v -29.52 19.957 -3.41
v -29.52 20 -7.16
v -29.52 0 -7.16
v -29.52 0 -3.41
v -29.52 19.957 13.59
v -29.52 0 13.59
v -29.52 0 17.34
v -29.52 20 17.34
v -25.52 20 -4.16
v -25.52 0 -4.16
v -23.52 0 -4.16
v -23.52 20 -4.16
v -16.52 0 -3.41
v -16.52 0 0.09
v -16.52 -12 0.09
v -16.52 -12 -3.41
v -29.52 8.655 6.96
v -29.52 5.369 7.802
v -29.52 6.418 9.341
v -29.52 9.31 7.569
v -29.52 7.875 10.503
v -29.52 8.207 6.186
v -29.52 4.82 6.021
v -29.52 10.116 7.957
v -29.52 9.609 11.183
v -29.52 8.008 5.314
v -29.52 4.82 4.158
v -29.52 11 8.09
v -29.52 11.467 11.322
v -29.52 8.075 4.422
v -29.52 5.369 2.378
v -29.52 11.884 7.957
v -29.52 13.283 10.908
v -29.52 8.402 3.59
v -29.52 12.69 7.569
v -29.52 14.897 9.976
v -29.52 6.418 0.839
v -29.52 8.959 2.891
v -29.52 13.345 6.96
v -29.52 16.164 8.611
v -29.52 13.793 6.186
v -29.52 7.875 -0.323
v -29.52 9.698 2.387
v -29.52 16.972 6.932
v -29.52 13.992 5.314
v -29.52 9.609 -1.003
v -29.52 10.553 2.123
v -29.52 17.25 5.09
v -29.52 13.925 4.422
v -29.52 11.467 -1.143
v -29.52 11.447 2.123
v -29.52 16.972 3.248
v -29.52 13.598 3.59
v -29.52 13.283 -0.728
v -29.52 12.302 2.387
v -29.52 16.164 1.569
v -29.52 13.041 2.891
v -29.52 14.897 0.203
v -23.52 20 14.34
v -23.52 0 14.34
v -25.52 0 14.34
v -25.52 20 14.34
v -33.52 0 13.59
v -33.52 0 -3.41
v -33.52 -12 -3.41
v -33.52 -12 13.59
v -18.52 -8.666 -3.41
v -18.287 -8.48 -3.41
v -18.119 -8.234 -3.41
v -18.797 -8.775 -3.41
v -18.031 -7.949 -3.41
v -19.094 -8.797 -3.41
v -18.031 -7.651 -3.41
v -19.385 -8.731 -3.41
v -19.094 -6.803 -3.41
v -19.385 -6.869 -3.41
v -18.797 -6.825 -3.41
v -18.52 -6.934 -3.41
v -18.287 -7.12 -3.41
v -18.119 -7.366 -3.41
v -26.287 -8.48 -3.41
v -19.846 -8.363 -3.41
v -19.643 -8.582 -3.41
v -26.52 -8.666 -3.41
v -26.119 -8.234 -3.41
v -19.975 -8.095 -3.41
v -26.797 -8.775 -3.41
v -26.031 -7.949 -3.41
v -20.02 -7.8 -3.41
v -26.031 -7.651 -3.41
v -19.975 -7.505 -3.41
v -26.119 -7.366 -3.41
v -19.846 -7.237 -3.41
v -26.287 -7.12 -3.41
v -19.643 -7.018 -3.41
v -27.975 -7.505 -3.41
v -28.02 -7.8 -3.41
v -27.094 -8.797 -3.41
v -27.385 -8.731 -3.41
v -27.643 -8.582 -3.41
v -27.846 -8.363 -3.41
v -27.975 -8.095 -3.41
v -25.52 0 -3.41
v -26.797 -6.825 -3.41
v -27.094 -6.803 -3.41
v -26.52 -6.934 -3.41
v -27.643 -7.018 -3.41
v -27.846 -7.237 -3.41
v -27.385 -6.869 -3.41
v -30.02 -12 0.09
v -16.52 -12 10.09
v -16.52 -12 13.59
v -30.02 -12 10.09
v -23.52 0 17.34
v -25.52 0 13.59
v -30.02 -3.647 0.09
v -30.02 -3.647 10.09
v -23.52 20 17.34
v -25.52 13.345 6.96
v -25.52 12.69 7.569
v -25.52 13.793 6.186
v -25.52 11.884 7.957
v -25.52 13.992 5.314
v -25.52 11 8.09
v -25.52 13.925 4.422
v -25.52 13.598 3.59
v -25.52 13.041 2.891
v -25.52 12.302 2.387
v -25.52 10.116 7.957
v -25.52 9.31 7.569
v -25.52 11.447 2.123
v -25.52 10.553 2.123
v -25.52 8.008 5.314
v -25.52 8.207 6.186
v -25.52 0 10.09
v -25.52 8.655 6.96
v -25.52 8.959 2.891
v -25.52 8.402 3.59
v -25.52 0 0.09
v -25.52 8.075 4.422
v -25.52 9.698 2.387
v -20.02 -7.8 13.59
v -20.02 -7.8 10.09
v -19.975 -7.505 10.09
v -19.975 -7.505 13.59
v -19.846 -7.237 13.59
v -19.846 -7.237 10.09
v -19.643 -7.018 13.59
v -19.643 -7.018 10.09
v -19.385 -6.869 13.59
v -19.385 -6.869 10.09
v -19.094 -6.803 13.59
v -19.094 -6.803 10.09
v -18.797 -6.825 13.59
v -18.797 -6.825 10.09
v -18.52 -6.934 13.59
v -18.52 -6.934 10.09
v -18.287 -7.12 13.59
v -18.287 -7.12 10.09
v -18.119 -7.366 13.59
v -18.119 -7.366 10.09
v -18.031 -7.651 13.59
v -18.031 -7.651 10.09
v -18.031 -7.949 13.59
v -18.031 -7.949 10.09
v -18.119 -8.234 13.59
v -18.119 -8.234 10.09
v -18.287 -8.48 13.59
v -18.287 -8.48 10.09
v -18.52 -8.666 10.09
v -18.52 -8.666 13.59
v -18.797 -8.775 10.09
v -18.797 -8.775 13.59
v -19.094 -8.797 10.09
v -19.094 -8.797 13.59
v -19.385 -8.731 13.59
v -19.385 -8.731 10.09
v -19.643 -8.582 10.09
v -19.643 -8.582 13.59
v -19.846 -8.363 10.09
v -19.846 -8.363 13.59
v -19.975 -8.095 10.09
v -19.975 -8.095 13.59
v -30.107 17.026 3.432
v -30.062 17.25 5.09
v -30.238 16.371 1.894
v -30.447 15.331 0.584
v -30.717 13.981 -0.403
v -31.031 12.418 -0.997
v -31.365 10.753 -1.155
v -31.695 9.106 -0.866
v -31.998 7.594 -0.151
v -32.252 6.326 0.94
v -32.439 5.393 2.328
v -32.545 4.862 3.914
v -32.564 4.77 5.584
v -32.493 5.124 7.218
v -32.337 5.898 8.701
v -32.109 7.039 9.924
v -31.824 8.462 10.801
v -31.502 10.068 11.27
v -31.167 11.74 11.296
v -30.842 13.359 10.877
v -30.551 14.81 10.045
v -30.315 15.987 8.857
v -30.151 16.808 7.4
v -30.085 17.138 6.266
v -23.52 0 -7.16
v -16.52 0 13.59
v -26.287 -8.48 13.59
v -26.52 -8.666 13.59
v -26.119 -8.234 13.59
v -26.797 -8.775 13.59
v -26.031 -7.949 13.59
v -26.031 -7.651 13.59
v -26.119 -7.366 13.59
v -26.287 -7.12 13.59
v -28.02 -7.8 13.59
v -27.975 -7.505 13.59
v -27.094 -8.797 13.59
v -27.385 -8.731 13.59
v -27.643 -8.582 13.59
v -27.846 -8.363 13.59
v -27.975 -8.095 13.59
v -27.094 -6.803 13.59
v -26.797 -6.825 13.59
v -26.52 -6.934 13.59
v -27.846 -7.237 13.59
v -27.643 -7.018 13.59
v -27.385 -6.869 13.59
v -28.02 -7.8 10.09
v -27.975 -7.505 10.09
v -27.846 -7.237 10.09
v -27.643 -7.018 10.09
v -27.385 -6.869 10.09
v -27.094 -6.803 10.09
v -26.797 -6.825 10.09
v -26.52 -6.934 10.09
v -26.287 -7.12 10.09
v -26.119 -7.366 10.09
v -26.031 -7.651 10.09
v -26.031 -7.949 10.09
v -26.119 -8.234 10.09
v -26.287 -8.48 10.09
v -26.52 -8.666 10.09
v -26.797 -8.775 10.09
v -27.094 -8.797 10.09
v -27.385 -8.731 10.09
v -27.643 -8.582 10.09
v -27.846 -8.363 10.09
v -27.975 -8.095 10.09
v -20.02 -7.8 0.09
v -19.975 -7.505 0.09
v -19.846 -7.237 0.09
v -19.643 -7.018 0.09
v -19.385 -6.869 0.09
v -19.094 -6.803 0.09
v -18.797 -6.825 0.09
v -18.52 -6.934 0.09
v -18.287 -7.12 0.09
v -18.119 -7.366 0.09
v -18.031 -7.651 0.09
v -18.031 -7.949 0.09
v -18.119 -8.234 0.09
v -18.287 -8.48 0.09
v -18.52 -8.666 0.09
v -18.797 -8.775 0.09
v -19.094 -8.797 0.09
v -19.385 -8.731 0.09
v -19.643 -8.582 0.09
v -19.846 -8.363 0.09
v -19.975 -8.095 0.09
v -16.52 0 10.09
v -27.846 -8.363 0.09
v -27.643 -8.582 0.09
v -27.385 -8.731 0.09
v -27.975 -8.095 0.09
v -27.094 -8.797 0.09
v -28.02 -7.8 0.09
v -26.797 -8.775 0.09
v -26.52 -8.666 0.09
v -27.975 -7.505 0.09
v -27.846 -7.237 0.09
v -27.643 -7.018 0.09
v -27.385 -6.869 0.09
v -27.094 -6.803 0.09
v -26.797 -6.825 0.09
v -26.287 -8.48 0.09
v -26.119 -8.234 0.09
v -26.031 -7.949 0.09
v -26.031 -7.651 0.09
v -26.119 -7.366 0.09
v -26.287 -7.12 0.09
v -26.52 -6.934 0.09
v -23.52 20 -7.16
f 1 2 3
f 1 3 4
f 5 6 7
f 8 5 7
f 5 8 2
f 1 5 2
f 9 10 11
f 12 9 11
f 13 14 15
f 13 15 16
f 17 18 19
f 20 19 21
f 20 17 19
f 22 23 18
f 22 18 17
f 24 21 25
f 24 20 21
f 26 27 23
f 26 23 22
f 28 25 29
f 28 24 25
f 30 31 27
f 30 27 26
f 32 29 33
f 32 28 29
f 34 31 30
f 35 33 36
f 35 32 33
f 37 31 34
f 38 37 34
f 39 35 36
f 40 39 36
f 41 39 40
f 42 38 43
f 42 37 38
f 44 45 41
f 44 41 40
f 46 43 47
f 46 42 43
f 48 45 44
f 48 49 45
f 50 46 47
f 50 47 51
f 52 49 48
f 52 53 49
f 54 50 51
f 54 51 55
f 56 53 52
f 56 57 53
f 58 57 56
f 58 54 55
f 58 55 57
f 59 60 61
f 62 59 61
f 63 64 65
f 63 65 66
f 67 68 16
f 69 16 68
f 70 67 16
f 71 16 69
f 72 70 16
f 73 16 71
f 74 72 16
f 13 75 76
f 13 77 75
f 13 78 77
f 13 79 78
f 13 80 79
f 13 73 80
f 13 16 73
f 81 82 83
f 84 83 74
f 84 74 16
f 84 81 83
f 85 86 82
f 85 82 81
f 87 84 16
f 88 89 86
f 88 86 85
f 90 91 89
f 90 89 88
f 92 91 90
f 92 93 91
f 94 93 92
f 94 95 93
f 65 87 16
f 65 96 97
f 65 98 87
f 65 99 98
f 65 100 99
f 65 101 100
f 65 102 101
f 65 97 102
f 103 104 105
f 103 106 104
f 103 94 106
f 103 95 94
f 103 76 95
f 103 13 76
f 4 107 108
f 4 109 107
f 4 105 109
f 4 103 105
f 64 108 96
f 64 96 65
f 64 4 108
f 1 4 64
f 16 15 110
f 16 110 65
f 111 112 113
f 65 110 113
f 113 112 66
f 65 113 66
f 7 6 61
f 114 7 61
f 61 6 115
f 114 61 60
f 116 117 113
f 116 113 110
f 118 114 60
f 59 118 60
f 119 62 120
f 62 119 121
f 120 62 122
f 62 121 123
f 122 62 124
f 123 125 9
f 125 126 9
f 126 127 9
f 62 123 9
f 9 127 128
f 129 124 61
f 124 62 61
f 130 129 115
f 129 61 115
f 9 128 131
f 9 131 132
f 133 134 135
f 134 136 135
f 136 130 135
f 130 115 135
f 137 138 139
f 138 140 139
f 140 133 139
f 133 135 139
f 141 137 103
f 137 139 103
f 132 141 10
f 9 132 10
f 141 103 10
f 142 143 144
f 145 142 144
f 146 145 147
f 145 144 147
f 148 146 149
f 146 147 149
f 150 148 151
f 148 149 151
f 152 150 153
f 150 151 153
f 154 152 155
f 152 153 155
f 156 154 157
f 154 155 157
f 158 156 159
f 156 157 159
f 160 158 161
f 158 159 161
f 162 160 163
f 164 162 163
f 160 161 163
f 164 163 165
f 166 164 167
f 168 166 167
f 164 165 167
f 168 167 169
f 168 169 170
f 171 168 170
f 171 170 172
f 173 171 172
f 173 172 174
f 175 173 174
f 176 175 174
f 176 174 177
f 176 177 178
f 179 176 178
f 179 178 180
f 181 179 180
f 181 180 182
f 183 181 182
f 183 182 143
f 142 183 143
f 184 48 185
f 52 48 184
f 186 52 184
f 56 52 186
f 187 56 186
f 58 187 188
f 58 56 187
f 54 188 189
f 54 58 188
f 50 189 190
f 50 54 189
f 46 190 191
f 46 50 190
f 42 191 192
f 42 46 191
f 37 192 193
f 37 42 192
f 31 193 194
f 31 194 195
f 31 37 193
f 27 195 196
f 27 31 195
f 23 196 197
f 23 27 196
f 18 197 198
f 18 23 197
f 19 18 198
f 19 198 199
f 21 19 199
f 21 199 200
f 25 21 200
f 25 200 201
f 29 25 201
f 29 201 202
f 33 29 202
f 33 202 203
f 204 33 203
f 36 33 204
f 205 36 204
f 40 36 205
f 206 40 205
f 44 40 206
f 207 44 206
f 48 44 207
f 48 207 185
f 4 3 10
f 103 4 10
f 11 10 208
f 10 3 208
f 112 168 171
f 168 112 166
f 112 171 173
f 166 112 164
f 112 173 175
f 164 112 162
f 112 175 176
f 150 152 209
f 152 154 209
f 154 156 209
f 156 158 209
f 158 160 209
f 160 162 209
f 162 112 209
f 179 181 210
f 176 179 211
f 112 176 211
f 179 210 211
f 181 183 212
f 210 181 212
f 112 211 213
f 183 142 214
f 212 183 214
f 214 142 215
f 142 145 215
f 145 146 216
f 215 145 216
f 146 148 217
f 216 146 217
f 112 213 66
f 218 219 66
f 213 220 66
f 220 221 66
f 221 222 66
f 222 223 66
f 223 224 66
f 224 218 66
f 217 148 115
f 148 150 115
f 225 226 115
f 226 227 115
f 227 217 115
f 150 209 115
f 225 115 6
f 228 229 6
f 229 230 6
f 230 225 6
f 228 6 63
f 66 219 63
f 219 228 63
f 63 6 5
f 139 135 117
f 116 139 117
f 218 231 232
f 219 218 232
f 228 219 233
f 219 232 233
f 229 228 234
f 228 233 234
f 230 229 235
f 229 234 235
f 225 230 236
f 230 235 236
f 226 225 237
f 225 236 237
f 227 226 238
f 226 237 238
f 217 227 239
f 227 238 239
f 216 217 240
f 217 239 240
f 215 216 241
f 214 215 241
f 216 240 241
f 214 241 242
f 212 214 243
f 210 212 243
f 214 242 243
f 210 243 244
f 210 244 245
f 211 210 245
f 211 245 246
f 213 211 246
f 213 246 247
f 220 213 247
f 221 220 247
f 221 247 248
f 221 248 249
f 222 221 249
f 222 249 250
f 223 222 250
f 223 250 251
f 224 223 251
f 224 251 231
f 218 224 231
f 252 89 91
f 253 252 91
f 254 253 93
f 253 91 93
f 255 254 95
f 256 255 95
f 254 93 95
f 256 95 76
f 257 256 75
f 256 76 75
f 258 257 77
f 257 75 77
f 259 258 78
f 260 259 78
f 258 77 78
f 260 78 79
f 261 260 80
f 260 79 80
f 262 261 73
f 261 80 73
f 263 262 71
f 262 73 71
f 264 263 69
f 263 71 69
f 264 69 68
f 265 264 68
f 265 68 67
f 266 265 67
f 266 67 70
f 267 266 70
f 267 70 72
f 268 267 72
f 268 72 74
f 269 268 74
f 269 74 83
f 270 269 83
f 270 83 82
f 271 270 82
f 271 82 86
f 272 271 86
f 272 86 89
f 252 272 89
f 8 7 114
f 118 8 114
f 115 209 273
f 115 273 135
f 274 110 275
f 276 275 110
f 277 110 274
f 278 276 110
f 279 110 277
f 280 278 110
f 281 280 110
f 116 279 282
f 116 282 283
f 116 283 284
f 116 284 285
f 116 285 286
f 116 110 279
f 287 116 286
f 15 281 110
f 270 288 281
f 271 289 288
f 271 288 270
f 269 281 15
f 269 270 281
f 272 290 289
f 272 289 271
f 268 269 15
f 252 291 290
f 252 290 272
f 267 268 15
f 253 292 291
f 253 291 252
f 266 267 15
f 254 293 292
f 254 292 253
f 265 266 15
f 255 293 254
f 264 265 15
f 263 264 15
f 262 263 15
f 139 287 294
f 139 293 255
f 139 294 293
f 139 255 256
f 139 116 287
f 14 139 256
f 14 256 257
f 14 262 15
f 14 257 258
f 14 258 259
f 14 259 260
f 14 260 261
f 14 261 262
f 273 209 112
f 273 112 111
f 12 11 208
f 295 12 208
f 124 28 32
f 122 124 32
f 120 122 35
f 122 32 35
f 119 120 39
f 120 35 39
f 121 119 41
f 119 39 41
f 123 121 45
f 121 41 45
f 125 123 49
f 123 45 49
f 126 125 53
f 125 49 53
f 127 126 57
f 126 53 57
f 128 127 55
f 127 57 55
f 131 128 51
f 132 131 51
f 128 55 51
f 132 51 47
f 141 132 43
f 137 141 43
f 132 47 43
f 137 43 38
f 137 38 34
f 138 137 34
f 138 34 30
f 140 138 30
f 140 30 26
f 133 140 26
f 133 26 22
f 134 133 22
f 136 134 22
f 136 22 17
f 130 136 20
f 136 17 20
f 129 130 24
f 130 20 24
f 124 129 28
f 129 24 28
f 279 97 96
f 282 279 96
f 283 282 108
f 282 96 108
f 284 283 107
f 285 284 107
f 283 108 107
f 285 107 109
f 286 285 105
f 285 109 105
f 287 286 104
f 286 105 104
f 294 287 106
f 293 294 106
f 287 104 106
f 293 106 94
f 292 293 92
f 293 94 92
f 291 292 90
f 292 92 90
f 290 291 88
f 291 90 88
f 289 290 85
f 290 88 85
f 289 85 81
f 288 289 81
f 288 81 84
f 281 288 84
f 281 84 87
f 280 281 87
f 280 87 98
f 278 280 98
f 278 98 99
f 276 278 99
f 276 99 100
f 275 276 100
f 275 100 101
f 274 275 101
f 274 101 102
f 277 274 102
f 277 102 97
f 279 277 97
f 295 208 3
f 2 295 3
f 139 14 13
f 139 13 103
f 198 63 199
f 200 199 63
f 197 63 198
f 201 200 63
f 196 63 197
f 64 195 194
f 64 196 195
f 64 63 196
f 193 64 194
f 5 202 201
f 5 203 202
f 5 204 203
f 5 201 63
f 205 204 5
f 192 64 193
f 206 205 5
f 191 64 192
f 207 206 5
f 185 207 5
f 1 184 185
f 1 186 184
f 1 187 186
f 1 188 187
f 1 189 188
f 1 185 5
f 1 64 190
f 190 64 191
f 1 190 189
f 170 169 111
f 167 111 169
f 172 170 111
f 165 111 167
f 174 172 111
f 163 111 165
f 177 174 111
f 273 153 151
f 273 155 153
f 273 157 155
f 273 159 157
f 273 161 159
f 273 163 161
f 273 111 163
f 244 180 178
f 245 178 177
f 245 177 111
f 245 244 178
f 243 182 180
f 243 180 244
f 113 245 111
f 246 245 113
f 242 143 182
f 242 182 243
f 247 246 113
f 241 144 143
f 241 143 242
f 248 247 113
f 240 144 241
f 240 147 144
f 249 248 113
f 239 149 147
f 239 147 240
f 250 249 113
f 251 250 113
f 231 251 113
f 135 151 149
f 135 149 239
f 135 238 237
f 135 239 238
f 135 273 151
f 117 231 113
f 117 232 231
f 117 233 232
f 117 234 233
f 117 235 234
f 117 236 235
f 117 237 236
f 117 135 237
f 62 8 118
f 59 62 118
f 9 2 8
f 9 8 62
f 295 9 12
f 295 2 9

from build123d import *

# Parameters (mm, degrees)
BOSS_EXTRUDE1_DEPTH = 20
SKETCH3_R           = 3
CUT_EXTRUDE1_DEPTH  = 4
BOSS_EXTRUDE2_DEPTH = 12
SKETCH5_R           = 1
CUT_EXTRUDE2_DEPTH  = 17
BOSS_EXTRUDE3_DEPTH = 17
SKETCH10_R          = 6.25
CUT_EXTRUDE3_DEPTH  = 4
BOSS_EXTRUDE4_DEPTH = 10


with BuildPart() as part:
    # Sketch2 → Boss-Extrude1 (new body)
    with BuildSketch(Plane(origin=(0, 0, 0), x_dir=(1, 0, 0), z_dir=(0, 1, 0))):
        Polygon((-29.519694138, 7.160148579), (-29.519694138, -17.339851421), (-23.519694138, -17.339851421), (-23.519694138, -14.339851421), (-25.519694138, -14.339851421), (-25.519694138, 4.160148579), (-23.519694138, 4.160148579), (-23.519694138, 7.160148579), align=None)
    extrude(amount=BOSS_EXTRUDE1_DEPTH)

    # Sketch3 → Cut-Extrude1 (cut)
    with BuildSketch(Plane.ZY.offset(29.519694138)):
        with Locations((5.089851421, 11)):
            Circle(SKETCH3_R)
    extrude(amount=-CUT_EXTRUDE1_DEPTH, mode=Mode.SUBTRACT)

    # Sketch4 → Boss-Extrude2 (add)
    with BuildSketch(Plane.XZ):
        Polygon((-16.519694138, -3.410148579), (-33.519694138, -3.410148579), (-33.519694138, 13.589851421), (-16.519694138, 13.589851421), (-16.519694138, 10.089851421), (-30.019694138, 10.089851421), (-30.019694138, 0.089851421), (-16.519694138, 0.089851421), align=None)
    extrude(amount=BOSS_EXTRUDE2_DEPTH)

    # Sketch5 → Cut-Extrude2 (cut)
    with BuildSketch(Plane(origin=(0, 0, -3.410148579), x_dir=(-1, 0, 0), z_dir=(0, 0, -1))):
        with Locations((19.019694138, -7.8)):
            Circle(SKETCH5_R)
        with Locations((27.019694138, -7.8)):
            Circle(SKETCH5_R)
    extrude(amount=-CUT_EXTRUDE2_DEPTH, mode=Mode.SUBTRACT)

    # Sketch6 → Boss-Extrude3 (add)
    with BuildSketch(Plane(origin=(0, 0, -3.410148579), x_dir=(-1, 0, 0), z_dir=(0, 0, -1))):
        Polygon((33.519694138, 0), (29.519694138, 19.957202976), (29.519694138, 0), align=None)
    extrude(amount=-BOSS_EXTRUDE3_DEPTH)

    # Sketch10 → Cut-Extrude3 (cut)
    with BuildSketch(Plane.ZY.offset(29.519694138)):
        with Locations(Location((5.089851421, 11, 0), (0, 0, 90))):
            Circle(SKETCH10_R)
    extrude(amount=CUT_EXTRUDE3_DEPTH, mode=Mode.SUBTRACT)

    # Sketch11 → Boss-Extrude4 (add)
    with BuildSketch(Plane(origin=(0, 0, 10.089851421), x_dir=(-1, 0, 0), z_dir=(0, 0, -1))):
        Polygon((25.519694138, 0), (30.019694138, -3.647368963), (30.019694138, 0), align=None)
    extrude(amount=BOSS_EXTRUDE4_DEPTH)


solid = part.part
